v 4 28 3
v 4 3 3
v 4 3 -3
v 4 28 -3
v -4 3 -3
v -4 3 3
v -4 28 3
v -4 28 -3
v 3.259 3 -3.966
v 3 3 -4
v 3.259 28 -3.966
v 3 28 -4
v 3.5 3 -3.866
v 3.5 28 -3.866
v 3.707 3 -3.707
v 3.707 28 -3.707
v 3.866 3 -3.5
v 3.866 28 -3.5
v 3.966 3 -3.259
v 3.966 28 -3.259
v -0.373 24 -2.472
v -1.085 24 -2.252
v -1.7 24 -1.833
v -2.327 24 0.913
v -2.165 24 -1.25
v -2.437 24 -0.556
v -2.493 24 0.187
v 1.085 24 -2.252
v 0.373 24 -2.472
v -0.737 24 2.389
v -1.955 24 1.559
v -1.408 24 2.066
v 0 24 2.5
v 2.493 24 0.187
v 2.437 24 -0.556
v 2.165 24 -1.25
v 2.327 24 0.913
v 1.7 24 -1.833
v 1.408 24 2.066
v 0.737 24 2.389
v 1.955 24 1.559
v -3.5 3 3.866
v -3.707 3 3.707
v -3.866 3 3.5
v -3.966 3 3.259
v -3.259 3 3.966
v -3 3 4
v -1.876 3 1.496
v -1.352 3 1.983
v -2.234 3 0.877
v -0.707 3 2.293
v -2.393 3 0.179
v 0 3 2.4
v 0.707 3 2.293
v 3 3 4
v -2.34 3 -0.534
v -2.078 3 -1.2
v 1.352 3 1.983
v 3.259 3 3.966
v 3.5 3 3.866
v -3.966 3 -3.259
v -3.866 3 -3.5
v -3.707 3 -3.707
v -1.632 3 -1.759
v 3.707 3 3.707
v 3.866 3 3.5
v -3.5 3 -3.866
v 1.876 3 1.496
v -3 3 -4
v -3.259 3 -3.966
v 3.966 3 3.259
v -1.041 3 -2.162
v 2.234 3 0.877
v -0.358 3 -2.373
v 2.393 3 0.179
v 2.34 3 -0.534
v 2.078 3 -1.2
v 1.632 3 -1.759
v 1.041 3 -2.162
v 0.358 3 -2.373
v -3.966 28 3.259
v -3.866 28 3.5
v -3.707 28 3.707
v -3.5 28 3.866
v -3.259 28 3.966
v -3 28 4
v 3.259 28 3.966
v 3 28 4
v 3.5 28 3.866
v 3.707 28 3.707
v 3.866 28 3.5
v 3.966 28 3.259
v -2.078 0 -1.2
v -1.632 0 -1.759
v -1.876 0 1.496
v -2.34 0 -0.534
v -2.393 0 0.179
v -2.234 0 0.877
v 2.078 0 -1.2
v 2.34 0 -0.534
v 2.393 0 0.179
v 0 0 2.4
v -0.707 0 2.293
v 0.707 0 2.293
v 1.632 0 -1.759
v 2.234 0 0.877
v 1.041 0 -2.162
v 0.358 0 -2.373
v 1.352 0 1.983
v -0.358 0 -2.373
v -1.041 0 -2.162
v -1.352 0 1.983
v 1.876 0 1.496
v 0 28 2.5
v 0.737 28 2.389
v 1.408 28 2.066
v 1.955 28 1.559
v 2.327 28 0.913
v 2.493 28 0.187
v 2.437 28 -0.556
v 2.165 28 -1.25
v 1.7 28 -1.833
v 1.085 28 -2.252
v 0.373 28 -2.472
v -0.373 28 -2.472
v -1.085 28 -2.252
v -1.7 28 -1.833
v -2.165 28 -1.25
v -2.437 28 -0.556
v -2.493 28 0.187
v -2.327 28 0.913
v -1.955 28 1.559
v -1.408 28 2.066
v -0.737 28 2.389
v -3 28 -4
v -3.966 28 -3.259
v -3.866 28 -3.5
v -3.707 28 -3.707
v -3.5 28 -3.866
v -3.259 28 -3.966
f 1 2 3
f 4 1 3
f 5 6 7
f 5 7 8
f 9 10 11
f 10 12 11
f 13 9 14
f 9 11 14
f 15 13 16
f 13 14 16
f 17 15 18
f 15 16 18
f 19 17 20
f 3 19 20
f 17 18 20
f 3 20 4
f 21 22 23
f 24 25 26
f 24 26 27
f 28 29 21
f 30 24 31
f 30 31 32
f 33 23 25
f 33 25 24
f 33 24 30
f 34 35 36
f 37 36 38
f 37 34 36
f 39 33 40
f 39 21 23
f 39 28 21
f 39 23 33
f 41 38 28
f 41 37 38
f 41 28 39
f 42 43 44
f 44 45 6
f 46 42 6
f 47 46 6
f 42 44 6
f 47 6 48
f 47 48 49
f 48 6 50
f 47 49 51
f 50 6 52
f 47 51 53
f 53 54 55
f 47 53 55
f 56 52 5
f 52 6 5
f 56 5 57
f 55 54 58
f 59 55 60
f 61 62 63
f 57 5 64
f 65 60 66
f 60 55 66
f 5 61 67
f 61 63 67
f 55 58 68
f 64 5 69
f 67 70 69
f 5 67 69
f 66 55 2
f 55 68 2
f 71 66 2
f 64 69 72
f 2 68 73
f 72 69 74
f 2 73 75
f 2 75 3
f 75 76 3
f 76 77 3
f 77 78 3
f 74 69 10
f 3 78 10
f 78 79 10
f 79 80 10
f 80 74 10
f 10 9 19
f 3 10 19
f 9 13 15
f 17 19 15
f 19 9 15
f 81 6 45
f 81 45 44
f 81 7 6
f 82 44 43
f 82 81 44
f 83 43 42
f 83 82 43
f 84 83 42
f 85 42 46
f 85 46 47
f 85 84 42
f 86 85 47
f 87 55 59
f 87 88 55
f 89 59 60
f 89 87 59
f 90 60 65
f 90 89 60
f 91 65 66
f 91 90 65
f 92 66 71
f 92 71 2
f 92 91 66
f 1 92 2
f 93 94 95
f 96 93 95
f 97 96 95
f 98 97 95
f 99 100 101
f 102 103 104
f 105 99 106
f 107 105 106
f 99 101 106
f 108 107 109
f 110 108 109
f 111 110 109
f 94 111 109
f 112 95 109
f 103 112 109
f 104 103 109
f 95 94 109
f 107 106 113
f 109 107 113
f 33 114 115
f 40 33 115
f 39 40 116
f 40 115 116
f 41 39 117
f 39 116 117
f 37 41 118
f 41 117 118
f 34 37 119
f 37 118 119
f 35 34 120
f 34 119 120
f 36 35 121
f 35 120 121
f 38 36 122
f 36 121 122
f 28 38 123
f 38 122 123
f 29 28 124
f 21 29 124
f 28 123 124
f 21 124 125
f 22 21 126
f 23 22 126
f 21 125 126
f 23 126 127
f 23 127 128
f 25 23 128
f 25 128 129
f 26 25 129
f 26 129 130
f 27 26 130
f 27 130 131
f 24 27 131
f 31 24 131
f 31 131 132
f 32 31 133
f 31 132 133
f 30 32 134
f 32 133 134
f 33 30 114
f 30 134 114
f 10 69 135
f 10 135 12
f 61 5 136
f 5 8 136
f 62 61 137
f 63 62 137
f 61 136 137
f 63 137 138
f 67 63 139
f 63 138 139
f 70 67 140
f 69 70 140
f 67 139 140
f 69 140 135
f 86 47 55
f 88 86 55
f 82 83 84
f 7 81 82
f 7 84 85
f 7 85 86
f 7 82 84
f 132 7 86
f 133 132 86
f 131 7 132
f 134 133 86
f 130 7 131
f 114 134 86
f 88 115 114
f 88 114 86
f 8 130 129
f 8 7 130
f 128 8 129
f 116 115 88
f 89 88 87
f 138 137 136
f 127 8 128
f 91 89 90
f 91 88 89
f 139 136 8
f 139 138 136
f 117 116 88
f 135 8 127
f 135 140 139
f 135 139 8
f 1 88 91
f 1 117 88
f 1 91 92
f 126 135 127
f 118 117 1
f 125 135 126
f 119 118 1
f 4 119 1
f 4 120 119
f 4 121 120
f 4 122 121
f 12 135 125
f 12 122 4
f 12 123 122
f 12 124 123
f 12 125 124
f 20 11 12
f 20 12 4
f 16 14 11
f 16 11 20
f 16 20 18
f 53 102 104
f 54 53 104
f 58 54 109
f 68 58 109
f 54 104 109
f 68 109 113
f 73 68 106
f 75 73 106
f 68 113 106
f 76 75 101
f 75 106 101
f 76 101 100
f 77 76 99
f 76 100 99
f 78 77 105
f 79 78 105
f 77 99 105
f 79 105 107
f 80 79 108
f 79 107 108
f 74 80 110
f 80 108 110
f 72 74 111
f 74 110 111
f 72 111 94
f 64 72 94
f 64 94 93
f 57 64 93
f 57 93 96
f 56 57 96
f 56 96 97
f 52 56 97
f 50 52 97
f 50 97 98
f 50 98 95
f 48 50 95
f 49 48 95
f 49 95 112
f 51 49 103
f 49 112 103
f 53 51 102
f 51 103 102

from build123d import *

# Parameters (mm, degrees)
SKETCH1_R           = 2.4
BOSS_EXTRUDE1_DEPTH = 3
SKETCH2_W           = 8
SKETCH2_H           = 8
BOSS_EXTRUDE2_DEPTH = 25
SKETCH3_R           = 2.5
CUT_EXTRUDE1_DEPTH  = 4
FILLET1_R           = 1


with BuildPart() as part:
    # Sketch1 → Boss-Extrude1 (new body)
    with BuildSketch(Plane(origin=(0, 0, 0), x_dir=(1, 0, 0), z_dir=(0, 1, 0))):
        with Locations(Location((0, 0, 0), (0, 0, 270))):
            Circle(SKETCH1_R)
    extrude(amount=BOSS_EXTRUDE1_DEPTH)

    # Sketch2 → Boss-Extrude2 (add)
    with BuildSketch(Plane(origin=(0, 3, 0), x_dir=(1, 0, 0), z_dir=(0, 1, 0))):
        Rectangle(SKETCH2_W, SKETCH2_H)
    extrude(amount=BOSS_EXTRUDE2_DEPTH)

    # Sketch3 → Cut-Extrude1 (cut)
    with BuildSketch(Plane(origin=(0, 28, 0), x_dir=(1, 0, 0), z_dir=(0, 1, 0))):
        with Locations(Location((0, 0, 0), (0, 0, 270))):
            Circle(SKETCH3_R)
    extrude(amount=-CUT_EXTRUDE1_DEPTH, mode=Mode.SUBTRACT)

    # Fillet1
    fillet1_edges = [part.edges().sort_by_distance(p)[0] for p in [
        (4, 15.5, 4),
        (4, 15.5, -4),
        (-4, 15.5, -4),
        (-4, 15.5, 4),
    ]]
    fillet(fillet1_edges, radius=FILLET1_R)


solid = part.part
